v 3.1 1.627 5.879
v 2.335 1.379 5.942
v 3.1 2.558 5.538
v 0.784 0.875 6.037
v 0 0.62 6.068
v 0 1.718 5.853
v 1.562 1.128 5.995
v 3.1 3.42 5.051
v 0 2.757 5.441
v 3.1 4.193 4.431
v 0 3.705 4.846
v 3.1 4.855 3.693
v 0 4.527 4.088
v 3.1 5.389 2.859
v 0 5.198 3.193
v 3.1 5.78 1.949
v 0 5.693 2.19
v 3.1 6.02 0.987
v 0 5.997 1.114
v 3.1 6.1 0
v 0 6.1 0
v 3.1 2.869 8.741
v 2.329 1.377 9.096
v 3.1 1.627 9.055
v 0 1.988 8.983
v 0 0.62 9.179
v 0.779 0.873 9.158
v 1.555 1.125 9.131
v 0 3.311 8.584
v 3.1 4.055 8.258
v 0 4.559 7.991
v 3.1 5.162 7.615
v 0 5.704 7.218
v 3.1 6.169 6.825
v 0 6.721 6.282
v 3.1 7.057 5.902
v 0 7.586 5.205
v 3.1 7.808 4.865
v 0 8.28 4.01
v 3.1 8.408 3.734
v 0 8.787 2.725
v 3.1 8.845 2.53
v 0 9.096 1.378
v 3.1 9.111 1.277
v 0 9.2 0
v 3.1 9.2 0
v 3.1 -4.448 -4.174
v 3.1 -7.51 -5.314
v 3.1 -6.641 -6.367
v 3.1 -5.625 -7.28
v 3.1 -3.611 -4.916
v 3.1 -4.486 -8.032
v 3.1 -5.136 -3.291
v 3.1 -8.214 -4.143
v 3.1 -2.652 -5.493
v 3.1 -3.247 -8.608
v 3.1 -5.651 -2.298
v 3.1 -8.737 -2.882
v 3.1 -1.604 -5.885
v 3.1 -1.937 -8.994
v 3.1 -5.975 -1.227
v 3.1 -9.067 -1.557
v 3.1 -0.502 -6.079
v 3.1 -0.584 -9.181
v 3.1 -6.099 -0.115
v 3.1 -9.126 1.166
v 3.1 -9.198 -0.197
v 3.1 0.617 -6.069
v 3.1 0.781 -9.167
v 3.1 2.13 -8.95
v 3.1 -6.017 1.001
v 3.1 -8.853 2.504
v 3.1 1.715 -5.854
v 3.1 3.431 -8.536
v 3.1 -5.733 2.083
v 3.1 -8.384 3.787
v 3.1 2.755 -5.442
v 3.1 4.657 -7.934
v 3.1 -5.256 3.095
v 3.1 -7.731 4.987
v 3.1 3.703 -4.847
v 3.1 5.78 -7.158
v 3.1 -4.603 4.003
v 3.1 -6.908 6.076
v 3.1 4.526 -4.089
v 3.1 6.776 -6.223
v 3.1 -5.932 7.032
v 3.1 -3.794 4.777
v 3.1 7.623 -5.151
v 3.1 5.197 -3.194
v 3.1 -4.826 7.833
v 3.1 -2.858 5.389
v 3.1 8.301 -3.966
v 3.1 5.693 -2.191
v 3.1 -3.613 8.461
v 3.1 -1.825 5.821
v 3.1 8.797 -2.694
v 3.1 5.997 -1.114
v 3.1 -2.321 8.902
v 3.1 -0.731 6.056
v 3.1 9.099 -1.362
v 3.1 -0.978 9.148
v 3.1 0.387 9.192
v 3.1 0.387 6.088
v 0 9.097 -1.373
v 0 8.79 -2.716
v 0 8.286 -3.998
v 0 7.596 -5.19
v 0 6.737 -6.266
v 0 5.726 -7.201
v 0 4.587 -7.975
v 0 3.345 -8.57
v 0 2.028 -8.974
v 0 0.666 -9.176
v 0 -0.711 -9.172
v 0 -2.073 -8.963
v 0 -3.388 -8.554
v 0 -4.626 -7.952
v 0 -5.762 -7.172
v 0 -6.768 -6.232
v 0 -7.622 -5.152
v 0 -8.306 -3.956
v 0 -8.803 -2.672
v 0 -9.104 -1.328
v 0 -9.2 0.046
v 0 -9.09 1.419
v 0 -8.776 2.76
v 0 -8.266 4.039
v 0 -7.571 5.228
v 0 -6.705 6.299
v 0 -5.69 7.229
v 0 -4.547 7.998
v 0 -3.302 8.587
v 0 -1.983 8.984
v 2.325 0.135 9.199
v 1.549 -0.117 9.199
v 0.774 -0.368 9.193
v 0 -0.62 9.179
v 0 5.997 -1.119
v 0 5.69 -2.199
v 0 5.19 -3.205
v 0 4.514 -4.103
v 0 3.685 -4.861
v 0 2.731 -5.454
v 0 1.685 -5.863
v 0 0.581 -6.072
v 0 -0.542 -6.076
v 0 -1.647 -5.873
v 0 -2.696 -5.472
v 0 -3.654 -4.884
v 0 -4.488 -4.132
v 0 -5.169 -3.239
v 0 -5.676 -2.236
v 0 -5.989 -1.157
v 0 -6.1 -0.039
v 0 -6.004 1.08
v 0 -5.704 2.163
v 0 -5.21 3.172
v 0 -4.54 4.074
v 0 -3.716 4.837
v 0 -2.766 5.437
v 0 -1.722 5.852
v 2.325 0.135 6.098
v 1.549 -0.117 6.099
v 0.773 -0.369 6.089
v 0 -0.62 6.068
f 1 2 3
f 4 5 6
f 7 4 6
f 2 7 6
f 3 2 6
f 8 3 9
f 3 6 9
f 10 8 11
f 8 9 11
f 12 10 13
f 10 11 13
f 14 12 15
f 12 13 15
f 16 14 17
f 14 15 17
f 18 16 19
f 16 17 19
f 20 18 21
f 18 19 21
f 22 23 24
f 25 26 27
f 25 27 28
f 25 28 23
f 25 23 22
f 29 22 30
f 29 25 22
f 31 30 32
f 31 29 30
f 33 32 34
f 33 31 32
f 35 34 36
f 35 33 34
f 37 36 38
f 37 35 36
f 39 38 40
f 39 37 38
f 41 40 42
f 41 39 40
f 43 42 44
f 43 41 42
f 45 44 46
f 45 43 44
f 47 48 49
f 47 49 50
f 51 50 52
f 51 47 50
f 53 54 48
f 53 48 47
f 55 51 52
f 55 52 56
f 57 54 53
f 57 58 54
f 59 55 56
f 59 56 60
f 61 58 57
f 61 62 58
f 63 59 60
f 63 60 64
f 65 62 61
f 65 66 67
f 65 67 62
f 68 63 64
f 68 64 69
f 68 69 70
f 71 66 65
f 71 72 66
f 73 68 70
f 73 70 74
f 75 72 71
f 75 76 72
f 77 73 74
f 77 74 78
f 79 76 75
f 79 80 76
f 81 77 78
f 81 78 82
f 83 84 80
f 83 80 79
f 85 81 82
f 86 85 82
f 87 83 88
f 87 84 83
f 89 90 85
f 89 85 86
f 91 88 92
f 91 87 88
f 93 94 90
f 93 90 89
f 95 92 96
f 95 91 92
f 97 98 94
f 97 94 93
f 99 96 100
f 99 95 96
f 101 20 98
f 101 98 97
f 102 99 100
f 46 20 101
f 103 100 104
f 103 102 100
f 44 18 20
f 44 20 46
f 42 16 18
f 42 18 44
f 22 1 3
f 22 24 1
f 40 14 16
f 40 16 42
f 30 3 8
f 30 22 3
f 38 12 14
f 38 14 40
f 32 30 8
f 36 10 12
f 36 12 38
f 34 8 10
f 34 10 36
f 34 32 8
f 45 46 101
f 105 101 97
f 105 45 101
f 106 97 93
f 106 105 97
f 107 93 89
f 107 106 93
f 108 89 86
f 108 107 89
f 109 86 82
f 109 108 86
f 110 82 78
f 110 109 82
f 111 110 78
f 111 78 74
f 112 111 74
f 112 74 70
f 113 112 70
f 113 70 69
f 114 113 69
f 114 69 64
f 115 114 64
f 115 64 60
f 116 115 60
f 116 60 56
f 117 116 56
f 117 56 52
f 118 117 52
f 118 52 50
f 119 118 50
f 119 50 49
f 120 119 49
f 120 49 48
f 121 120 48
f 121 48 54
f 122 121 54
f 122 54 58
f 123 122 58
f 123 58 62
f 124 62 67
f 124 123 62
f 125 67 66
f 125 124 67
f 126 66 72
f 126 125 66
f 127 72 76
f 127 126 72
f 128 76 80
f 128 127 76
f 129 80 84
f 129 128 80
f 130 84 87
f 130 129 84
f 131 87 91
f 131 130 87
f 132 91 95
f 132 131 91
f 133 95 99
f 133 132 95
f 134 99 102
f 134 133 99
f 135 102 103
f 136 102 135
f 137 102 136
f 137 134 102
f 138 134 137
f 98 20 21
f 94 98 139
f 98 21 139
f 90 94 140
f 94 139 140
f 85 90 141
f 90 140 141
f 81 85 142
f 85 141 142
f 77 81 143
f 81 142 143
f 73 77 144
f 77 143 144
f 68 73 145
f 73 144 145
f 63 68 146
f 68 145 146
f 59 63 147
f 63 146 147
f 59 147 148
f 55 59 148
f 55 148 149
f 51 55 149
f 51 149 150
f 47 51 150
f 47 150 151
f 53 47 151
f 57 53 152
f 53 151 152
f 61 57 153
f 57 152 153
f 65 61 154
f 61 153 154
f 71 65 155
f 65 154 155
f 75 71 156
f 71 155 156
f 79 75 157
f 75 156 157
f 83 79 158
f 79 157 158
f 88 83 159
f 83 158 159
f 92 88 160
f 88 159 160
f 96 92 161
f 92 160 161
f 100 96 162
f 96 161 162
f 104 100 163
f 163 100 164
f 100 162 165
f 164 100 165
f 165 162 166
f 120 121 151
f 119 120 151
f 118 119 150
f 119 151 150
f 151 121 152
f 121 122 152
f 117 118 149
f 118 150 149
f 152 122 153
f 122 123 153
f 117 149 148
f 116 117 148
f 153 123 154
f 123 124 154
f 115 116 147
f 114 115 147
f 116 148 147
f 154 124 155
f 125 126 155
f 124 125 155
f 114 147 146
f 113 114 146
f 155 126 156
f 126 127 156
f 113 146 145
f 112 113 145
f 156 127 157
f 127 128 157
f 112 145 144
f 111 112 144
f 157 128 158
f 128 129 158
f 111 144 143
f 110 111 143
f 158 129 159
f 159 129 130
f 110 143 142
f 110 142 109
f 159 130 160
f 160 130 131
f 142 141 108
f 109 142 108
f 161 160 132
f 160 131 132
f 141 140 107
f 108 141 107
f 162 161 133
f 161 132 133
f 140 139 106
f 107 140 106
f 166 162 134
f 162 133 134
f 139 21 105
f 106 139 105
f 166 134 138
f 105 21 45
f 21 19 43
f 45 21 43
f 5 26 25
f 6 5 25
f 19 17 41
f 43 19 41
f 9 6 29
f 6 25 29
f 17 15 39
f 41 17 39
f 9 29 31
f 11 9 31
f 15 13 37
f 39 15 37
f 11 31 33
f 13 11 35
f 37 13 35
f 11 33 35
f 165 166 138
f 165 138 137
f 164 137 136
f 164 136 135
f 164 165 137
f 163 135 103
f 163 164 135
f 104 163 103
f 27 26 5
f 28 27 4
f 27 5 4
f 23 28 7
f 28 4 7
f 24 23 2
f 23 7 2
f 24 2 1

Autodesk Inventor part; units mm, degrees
ref_plane "YZ Plane" through (0, 0, 0) normal (1, 0, 0) x (0, 1, 0)
ref_plane "XZ Plane" through (0, 0, 0) normal (0, 1, 0) x (-1, 0, 0)
sketch "草图1" plane through (0, 0, 0) normal (1, 0, 0) x (0, 1, 0)
  circle A0 centre (0, 0) radius 9.2
  circle A1 centre (0, 0) radius 6.1
  dimension "d0" = 12.2
  dimension "d1" = 18.4
extrude "轴承体" add sketch "草图1" along normal blind 3.1
sketch "草图2" plane through (0, 0, 0) normal (0, 0, 1) x (1, 0, 0)
  line L0 (0, -6.1) -> (0, 6.1) projected
  line L1 (3.1, 9.2) -> (3.1, -9.2) projected
  line L2 (-1.2, 0) -> (7.2, 0) projected
  line L3 (0, -0.62) -> (3.1, 0.3873)
  line L4 (0, 0.62) -> (3.1, 1.6273)
  dimension "d4" = 0.62
  dimension "d5" = 0.62
  dimension "d6" = 72
extrude "切口" cut sketch "草图2" along normal up to next contours L0 L2 L3 | L0 L4 L1 L3 L2
ref_plane "Work Plane1" through (0, 0, 0) normal (0, -1, 0) x (1, 0, 0)
equation "\"d0\" = SD1"
equation "\"d1\" = SD2"
equation "\"d2\" = SD"
equation "\"d4\" = 0.2 * SD"
equation "\"d5\" = 0.2 * SD"
equation "\"d6\" = FAWI"
equation "\"d7\" = SD"
equation "\"SD1\" = 12.2"
equation "\"SD2\" = 18.4"
equation "\"SD\" = 3.1"
equation "\"FAWI\" = 72deg"
equation "\"NND\" = 12"
properties part number "垫圈 GB 93-87 12" material "钢，软"
